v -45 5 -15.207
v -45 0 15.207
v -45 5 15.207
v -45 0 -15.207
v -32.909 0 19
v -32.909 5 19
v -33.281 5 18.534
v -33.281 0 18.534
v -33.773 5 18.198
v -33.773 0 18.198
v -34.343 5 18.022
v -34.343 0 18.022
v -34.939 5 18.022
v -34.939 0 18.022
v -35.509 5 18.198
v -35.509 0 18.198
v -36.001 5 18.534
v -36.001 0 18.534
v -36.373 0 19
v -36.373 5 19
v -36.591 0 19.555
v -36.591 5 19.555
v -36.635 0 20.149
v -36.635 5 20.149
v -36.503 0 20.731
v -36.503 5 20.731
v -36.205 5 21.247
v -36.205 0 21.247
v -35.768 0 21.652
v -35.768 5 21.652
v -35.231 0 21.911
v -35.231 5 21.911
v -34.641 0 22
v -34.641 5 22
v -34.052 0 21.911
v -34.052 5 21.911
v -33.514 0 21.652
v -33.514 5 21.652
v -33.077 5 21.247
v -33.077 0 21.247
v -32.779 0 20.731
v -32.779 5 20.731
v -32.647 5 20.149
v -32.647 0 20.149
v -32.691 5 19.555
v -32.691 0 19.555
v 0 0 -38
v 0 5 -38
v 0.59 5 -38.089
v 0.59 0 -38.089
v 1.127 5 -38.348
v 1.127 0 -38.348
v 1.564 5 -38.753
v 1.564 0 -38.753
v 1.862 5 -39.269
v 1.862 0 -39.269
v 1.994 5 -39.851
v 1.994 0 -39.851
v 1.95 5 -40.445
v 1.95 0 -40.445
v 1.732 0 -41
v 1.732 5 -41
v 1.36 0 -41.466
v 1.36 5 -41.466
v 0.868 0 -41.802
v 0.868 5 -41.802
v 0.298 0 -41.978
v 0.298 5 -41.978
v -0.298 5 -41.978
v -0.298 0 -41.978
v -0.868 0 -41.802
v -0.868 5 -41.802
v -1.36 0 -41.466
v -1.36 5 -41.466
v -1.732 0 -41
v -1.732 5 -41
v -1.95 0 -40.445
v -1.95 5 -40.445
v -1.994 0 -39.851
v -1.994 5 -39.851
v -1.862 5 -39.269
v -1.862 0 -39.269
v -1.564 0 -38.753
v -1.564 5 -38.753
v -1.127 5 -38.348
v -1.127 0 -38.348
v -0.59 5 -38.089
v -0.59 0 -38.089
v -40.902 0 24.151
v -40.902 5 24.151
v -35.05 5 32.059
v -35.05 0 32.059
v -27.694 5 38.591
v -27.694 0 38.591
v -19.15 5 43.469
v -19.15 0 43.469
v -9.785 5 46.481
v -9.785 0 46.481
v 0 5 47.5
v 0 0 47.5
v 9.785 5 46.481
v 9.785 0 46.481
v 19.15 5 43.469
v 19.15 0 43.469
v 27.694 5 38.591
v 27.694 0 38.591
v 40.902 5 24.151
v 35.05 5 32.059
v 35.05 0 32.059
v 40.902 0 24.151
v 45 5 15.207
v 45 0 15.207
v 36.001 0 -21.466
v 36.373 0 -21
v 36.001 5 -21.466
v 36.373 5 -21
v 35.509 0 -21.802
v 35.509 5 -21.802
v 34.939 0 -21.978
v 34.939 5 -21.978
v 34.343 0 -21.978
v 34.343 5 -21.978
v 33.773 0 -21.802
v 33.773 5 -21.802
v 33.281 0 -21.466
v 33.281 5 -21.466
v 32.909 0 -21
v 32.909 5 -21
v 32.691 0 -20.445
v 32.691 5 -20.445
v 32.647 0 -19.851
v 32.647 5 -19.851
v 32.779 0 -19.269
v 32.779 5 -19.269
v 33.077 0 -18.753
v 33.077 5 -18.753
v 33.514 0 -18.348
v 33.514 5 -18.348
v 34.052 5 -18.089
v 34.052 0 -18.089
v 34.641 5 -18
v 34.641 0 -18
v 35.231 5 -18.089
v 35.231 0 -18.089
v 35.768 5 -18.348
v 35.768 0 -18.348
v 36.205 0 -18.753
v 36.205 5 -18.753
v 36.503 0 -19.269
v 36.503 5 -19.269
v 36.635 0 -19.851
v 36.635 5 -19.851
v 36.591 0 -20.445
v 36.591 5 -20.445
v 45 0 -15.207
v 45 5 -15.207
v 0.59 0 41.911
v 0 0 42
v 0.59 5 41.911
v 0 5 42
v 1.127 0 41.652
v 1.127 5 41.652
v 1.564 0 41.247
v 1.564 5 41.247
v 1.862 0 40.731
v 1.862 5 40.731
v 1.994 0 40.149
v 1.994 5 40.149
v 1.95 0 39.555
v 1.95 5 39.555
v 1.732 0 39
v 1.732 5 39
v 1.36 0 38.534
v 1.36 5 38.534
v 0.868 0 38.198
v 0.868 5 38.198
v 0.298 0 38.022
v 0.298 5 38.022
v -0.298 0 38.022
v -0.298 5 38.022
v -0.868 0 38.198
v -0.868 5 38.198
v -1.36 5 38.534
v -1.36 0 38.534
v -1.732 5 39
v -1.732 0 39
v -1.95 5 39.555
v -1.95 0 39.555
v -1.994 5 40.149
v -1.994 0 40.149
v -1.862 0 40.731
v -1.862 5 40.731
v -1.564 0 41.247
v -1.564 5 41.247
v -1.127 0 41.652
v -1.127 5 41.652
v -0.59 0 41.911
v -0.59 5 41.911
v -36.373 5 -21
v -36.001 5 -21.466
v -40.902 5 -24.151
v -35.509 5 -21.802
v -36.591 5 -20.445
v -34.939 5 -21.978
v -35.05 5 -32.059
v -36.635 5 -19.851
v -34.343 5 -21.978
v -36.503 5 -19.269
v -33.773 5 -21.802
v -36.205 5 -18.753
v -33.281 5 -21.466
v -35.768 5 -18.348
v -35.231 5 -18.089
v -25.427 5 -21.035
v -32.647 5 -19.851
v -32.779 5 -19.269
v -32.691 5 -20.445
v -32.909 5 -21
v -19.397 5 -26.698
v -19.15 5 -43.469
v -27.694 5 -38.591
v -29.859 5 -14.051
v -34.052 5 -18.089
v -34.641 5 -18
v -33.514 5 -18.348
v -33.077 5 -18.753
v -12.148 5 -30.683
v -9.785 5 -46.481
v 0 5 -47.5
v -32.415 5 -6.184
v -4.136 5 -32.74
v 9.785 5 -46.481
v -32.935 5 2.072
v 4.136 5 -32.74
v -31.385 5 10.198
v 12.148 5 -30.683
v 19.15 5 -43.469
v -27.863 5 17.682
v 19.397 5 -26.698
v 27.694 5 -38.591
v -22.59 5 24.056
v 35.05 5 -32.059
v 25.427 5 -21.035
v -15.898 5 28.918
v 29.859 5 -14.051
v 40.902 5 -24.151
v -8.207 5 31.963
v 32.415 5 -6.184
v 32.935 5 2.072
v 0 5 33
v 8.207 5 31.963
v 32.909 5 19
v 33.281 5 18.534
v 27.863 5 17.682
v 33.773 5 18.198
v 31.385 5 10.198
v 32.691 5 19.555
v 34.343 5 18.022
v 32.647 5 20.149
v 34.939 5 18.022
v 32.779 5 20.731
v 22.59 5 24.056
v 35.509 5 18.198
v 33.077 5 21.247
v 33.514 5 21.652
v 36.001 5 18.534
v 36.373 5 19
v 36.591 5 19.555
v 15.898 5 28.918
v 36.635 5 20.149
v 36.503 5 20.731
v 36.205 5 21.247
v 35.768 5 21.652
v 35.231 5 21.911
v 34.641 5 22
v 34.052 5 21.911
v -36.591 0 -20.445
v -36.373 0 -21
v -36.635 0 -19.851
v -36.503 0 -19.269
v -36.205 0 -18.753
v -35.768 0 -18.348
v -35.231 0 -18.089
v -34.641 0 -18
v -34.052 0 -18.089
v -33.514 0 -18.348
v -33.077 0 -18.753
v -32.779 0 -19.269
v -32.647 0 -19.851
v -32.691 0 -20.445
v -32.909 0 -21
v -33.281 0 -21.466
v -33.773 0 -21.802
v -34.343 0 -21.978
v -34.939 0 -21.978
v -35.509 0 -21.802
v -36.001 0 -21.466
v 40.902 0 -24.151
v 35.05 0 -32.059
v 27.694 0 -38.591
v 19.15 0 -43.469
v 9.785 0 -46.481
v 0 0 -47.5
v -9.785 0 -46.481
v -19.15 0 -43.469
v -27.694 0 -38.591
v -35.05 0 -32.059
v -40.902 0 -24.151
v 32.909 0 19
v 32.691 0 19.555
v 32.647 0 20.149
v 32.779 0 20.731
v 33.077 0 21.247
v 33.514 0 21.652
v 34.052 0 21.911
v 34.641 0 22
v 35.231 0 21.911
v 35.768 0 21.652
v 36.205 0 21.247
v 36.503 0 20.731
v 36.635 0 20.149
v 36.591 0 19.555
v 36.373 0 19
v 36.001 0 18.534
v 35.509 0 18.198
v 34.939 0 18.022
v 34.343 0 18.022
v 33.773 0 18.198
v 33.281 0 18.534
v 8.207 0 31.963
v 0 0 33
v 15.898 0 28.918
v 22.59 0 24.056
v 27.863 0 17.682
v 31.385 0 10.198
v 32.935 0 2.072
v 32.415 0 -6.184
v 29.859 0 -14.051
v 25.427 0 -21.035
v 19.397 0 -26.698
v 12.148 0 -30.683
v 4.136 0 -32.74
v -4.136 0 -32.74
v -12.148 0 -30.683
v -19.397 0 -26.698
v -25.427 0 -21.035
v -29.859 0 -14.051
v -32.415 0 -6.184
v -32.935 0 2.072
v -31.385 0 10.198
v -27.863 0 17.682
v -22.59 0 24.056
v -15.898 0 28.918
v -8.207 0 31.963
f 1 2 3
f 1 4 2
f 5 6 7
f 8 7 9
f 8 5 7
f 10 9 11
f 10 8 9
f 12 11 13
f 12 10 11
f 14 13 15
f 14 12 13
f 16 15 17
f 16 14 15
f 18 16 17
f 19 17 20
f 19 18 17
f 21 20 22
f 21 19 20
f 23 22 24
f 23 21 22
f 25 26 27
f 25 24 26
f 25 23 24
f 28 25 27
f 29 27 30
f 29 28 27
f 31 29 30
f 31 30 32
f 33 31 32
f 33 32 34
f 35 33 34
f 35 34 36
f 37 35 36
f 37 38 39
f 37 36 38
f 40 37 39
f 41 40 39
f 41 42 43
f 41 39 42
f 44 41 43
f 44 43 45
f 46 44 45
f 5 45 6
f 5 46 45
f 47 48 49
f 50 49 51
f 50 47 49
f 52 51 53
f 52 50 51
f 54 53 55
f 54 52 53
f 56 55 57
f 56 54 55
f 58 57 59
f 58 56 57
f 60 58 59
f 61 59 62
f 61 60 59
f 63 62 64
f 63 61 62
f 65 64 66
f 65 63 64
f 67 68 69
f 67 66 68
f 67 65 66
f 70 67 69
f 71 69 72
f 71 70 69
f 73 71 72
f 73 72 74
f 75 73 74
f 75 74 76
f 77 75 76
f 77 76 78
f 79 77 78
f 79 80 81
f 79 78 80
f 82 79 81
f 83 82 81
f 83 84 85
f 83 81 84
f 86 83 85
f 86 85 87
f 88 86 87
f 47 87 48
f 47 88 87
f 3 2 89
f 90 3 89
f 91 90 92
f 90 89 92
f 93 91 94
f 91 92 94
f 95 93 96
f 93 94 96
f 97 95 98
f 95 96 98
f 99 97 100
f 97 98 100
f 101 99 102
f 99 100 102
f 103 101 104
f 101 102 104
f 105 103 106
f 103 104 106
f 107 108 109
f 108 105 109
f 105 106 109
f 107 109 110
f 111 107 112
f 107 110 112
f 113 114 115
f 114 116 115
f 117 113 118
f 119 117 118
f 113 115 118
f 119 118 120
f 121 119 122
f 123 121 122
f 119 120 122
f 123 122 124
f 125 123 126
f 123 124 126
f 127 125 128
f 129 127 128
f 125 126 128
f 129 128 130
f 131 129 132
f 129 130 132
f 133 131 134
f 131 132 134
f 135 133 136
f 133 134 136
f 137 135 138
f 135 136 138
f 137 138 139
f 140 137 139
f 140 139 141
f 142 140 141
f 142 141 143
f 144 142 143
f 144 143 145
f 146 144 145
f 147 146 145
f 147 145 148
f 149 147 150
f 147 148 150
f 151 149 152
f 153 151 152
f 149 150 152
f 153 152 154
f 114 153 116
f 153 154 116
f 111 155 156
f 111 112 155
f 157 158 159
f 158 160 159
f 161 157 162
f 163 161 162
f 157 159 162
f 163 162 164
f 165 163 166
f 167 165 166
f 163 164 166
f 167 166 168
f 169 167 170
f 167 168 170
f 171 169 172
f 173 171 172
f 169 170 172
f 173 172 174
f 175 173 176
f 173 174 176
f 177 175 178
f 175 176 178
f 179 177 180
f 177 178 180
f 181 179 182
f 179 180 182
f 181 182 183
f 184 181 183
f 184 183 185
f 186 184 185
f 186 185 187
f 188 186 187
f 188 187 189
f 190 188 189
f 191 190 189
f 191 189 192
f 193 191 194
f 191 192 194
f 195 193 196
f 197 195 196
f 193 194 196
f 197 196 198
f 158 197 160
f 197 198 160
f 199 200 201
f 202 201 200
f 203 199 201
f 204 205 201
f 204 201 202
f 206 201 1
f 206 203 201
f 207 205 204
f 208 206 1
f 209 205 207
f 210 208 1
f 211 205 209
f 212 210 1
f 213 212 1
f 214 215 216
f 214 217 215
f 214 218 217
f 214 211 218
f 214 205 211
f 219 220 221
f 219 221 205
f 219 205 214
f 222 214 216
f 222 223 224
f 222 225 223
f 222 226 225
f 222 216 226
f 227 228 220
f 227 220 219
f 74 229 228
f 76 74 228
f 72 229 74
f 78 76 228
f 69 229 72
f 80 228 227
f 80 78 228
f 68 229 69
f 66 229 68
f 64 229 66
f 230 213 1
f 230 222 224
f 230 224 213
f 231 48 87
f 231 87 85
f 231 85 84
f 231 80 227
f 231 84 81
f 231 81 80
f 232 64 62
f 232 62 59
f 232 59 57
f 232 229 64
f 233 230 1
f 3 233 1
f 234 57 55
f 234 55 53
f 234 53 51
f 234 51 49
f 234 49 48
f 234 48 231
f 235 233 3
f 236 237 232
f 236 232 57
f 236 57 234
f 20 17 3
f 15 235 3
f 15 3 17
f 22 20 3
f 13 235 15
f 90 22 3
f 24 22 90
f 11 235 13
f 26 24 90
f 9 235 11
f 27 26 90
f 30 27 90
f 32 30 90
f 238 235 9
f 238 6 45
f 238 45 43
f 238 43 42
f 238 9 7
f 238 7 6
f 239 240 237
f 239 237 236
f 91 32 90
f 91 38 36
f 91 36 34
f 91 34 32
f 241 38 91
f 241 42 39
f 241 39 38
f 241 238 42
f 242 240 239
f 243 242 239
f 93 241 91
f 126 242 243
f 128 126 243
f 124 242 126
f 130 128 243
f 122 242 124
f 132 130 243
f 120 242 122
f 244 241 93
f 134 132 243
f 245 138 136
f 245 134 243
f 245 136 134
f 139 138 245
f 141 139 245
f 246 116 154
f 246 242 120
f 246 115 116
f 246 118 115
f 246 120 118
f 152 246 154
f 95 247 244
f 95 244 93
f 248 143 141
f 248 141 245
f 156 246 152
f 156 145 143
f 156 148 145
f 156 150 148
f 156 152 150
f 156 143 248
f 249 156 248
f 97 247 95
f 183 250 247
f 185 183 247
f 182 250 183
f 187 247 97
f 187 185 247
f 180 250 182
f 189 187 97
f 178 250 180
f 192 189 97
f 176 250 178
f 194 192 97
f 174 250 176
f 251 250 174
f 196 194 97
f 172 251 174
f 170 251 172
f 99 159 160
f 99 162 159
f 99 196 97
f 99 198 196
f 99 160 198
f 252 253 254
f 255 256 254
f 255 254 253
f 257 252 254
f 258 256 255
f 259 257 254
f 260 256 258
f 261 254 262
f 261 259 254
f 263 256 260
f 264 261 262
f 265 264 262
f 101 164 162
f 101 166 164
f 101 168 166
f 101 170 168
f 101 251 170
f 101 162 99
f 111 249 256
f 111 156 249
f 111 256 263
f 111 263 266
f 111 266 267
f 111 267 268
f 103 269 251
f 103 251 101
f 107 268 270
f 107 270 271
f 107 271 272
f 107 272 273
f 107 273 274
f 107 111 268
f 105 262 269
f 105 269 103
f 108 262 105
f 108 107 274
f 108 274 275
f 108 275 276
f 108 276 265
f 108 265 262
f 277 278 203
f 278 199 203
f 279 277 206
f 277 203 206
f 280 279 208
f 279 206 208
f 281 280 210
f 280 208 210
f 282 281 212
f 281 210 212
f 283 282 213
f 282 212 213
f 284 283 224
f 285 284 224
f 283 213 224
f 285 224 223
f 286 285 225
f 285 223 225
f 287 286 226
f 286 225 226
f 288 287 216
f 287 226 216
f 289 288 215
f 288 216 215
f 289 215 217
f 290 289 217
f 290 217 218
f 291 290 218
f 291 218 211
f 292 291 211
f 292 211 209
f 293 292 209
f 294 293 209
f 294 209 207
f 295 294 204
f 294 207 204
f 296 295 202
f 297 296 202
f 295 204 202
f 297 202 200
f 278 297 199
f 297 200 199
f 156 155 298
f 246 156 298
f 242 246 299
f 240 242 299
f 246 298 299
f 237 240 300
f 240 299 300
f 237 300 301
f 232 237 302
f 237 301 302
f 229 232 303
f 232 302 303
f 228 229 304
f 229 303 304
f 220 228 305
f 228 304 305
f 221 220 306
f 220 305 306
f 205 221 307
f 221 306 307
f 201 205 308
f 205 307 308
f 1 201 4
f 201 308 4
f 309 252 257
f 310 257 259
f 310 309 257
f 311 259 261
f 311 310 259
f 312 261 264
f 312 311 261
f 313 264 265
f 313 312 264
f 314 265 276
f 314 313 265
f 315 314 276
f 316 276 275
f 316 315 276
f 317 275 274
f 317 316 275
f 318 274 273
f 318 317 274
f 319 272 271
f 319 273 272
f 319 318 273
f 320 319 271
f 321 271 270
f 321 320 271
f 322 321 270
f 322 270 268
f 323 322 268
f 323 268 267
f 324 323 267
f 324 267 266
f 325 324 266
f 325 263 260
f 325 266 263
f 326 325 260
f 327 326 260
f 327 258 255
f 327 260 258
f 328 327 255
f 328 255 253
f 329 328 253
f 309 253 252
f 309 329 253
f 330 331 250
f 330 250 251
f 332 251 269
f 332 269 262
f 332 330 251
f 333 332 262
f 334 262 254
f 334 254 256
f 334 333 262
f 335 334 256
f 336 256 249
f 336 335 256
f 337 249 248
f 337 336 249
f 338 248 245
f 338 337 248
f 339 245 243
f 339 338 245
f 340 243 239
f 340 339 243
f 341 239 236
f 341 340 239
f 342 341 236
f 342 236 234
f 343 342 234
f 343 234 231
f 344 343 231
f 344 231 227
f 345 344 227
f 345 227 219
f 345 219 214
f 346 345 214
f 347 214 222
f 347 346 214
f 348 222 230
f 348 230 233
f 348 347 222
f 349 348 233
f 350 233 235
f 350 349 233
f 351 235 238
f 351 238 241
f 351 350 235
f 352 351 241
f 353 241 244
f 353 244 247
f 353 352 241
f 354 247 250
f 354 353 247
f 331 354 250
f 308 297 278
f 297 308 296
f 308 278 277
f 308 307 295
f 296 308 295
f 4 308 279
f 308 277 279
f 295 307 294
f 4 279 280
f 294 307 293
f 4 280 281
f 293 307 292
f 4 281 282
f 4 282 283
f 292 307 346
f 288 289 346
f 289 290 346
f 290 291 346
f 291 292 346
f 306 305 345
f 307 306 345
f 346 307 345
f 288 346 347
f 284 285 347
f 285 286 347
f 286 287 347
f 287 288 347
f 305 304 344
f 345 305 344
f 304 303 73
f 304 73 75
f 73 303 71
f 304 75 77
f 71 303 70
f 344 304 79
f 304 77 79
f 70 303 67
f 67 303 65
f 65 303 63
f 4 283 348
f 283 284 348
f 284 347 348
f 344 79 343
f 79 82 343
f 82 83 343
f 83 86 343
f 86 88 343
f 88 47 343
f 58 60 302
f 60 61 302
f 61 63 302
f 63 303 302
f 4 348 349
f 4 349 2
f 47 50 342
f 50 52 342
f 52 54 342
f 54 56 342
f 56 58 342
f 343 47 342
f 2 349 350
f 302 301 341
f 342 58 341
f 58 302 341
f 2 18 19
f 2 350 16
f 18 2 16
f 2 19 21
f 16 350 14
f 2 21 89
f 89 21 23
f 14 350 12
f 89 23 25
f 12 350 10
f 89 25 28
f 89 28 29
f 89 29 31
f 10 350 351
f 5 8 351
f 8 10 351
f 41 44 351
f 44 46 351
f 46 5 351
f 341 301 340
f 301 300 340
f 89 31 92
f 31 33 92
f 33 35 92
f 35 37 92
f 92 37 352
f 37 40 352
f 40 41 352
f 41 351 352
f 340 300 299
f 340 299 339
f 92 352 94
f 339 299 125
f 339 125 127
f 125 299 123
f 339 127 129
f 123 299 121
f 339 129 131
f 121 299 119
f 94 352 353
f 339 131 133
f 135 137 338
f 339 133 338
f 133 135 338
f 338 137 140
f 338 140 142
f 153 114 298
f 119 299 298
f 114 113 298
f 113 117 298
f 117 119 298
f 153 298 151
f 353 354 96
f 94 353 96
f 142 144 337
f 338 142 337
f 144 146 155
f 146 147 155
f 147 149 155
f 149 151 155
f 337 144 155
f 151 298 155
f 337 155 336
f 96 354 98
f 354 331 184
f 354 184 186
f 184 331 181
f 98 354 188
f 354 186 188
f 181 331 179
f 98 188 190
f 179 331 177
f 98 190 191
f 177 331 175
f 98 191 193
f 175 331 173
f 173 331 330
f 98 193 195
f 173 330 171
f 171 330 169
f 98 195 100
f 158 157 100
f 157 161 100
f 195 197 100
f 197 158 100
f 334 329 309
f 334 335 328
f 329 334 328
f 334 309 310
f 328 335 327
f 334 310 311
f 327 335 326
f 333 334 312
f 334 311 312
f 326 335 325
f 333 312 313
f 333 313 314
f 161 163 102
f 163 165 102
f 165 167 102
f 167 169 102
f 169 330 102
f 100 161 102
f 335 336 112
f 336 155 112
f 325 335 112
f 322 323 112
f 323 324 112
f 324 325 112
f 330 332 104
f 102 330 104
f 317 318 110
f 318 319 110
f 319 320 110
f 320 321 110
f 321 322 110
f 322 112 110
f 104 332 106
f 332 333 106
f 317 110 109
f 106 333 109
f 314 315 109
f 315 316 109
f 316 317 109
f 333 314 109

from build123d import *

# Parameters (mm, degrees)
SKETCH_1_R               = 47.5
SKETCH_1_R_2             = 33
EXTRUDE_1_DEPTH          = 5
SKETCH_2_W               = 10
SKETCH_2_H               = 20
CUT_EXTRUDE_1_DEPTH      = 25
SKETCH_3_R               = 2
CUT_EXTRUDE_2_DEPTH      = 25
PATTERN_CIRCULAR_1_COUNT = 3


with BuildPart() as part:
    # Эскиз1 → Бобышка-Вытянуть1 (new body)
    with BuildSketch(Plane(origin=(0, 0, 0), x_dir=(1, 0, 0), z_dir=(0, 1, 0))):
        with Locations(Location((0, 0, 0), (0, 0, 270))):
            Circle(SKETCH_1_R)
        with Locations(Location((0, 0, 0), (0, 0, 270))):
            Circle(SKETCH_1_R_2, mode=Mode.SUBTRACT)
    extrude(amount=EXTRUDE_1_DEPTH)

    # Эскиз2 → Вырез-Вытянуть1 (cut, symmetric)
    with BuildSketch(Plane.XY):
        with Locations((-50, 5)):
            Rectangle(SKETCH_2_W, SKETCH_2_H)
        with Locations((50, 5)):
            Rectangle(SKETCH_2_W, SKETCH_2_H)
    extrude(amount=CUT_EXTRUDE_1_DEPTH, both=True, mode=Mode.SUBTRACT)

    # Эскиз3 → Вырез-Вытянуть2 (cut, symmetric)
    with BuildSketch(Plane(origin=(0, 0, 0), x_dir=(1, 0, 0), z_dir=(0, 1, 0))):
        with Locations(Location((0, 40, 0), (0, 0, 270))):
            Circle(SKETCH_3_R)
        with Locations(Location((0, -40, 0), (0, 0, 270))):
            Circle(SKETCH_3_R)
    cut_extrude_2 = extrude(amount=CUT_EXTRUDE_2_DEPTH, both=True, mode=Mode.SUBTRACT)

    # Круговой массив1: Вырез-Вытянуть2 ×3 about axis
    pattern_circular_1_axis = Axis((0, 0, 0), (0, 1, 0))
    for i in range(1, PATTERN_CIRCULAR_1_COUNT):
        add(cut_extrude_2.rotate(pattern_circular_1_axis, i * 360 / PATTERN_CIRCULAR_1_COUNT), mode=Mode.SUBTRACT)


solid = part.part
